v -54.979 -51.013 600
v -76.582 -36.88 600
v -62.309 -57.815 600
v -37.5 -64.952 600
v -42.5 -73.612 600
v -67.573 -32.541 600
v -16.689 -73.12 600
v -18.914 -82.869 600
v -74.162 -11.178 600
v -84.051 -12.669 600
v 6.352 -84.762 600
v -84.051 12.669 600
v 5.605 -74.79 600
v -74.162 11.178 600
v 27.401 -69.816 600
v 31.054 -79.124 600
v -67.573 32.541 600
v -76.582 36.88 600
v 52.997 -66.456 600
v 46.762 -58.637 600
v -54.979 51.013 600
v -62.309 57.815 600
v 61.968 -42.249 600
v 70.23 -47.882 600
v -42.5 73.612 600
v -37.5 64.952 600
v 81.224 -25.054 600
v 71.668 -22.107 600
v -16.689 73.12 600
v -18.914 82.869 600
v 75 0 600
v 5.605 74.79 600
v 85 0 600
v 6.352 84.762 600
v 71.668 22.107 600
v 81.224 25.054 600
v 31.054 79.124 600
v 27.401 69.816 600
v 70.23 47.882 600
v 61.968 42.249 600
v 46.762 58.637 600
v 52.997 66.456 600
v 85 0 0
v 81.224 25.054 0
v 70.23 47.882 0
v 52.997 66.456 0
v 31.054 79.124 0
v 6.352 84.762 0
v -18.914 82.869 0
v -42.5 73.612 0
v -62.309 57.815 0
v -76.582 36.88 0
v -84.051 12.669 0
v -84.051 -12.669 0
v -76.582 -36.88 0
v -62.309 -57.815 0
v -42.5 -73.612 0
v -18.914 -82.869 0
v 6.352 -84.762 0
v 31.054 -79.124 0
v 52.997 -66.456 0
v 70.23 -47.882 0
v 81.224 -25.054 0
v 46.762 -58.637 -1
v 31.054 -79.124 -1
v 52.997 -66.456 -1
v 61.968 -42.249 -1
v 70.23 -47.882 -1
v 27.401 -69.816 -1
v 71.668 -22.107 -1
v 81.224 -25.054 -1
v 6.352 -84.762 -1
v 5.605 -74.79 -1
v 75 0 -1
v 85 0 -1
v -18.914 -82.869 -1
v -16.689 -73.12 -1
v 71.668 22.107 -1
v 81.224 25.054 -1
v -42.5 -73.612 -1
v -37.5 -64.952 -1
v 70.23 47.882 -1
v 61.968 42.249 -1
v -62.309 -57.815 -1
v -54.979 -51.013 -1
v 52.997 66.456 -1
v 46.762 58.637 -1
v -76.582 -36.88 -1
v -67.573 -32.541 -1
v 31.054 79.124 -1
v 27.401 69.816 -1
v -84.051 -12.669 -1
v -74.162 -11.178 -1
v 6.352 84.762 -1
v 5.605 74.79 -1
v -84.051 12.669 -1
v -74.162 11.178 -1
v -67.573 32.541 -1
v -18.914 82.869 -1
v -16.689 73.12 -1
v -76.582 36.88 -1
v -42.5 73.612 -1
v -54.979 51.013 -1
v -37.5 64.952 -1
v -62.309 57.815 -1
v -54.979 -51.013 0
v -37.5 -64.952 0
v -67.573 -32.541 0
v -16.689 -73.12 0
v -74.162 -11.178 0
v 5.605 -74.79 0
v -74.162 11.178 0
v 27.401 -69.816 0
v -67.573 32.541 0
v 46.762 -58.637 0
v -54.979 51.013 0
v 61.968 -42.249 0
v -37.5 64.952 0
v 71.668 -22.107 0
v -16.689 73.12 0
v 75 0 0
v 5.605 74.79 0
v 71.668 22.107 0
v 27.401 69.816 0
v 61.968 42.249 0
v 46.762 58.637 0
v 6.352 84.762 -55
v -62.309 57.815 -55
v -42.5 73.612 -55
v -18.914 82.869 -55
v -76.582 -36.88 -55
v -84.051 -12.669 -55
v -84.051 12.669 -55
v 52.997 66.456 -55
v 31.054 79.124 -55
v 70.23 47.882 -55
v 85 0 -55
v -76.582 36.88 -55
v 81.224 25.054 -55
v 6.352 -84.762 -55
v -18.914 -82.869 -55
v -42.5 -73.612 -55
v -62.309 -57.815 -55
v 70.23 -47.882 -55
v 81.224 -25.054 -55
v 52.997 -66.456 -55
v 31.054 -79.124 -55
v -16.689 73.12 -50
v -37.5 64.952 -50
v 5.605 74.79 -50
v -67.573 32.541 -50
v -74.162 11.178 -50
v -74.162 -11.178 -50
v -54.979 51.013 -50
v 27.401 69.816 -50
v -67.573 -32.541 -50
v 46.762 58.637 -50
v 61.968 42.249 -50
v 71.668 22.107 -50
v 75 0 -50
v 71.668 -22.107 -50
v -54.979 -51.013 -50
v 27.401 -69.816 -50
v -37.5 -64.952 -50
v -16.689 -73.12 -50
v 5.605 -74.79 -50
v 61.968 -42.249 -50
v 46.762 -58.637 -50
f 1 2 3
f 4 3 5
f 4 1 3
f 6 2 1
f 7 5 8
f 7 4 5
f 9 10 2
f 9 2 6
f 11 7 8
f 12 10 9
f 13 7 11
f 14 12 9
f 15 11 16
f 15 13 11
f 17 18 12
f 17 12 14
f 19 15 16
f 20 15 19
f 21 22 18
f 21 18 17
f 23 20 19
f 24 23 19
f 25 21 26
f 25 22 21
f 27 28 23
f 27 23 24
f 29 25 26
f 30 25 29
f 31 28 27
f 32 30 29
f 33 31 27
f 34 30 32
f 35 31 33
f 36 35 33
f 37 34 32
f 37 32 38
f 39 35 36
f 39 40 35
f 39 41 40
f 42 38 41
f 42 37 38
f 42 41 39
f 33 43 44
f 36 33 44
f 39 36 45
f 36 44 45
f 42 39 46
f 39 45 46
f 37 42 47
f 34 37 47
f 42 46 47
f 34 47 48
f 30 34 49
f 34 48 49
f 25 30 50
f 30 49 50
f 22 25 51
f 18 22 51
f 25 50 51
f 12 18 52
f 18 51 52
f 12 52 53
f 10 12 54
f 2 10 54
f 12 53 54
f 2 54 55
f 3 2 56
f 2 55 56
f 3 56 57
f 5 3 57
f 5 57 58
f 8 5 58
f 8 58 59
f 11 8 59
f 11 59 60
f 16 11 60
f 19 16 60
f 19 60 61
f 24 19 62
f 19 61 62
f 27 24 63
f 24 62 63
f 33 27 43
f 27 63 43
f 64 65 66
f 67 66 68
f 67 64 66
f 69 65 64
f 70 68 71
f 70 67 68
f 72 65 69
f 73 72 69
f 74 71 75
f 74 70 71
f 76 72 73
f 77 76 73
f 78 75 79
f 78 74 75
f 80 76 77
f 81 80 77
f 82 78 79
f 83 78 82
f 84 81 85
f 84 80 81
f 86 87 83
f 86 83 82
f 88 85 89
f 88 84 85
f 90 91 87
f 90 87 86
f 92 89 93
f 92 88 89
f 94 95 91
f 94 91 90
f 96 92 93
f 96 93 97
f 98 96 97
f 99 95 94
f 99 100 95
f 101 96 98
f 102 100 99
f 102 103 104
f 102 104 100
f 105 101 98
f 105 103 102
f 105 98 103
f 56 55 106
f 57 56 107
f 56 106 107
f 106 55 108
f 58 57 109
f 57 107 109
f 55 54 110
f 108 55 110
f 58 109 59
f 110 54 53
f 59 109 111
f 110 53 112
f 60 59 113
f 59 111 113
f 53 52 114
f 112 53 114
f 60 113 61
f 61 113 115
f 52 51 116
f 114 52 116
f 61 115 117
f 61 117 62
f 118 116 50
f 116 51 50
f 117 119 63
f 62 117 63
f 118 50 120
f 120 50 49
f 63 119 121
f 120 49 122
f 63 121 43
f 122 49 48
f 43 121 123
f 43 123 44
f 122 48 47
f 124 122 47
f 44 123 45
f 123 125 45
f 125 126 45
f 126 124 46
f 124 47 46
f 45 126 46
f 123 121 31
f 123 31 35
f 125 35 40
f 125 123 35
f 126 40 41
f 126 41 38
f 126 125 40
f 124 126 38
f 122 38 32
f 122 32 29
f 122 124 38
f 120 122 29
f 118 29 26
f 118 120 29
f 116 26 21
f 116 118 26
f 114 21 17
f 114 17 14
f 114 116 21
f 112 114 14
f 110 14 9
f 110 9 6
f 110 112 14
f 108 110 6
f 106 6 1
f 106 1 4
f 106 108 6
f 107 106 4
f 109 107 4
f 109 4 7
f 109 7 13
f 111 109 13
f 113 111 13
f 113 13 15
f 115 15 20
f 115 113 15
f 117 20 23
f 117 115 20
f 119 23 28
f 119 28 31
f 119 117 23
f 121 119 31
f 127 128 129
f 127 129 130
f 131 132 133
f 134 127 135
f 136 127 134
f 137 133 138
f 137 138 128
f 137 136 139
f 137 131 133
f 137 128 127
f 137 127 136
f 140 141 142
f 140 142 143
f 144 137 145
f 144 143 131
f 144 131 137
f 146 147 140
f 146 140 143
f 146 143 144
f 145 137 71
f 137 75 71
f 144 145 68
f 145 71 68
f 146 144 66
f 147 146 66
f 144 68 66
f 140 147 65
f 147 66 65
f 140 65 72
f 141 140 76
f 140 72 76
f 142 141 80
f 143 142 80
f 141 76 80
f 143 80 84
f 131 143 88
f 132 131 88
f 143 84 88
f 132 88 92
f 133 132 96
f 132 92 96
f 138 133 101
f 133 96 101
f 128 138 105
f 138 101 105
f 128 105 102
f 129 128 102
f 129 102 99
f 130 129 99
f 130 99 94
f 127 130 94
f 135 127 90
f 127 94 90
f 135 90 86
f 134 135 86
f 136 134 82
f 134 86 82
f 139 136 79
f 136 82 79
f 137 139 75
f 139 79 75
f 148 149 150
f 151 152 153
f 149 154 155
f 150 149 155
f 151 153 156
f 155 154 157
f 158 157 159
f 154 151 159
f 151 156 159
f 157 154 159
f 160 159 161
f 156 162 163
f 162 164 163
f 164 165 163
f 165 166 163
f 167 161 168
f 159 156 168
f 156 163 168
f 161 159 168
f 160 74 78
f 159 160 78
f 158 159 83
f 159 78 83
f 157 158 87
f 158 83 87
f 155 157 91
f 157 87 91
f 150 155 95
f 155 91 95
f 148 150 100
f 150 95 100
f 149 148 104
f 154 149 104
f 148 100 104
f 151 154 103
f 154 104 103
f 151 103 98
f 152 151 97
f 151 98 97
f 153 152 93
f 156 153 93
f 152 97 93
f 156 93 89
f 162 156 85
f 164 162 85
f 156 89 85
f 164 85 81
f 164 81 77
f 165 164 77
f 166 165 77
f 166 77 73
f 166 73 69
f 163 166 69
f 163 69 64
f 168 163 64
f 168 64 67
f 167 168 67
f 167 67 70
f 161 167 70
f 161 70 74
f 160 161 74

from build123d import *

# Parameters (mm, degrees)
F0_R          = 85
F0_R_2        = 75
F1_DEPTH      = 600
F2_DEPTH      = 50
F3_W          = 175
F3_H          = 1
F4_DEPTH      = 85.9
F4_DEPTH_BACK = 91.3
F5_R          = 85
F6_DEPTH      = 5


with BuildPart() as f1:
    # F0 (on Top) → F1 (new body)
    with BuildSketch(Plane.XY):
        Circle(F0_R)
        Circle(F0_R_2, mode=Mode.SUBTRACT)
    extrude(amount=F1_DEPTH)


with BuildPart() as f2:
    # F2 (new): a face of the model
    f2_faces = [f1.part.faces().sort_by_distance(p)[0] for p in [
        (-82.595836944, 0, 0),
    ]]
    extrude(f2_faces, amount=F2_DEPTH)

    # F3 (on Right) → F4 (cut, two sides)
    with BuildSketch(Plane.YZ) as f4_sk:
        with Locations((0.6284113847, -0.5)):
            Rectangle(F3_W, F3_H)
    extrude(amount=-F4_DEPTH, mode=Mode.SUBTRACT)
    extrude(f4_sk.sketch, amount=F4_DEPTH_BACK, mode=Mode.SUBTRACT)

    # F5 (on face) → F6 (join)
    with BuildSketch(Plane(origin=(0, 0, -50), x_dir=(1, 0, 0), z_dir=(0, 0, -1))):
        Circle(F5_R)
    extrude(amount=F6_DEPTH)


solid = Compound([f1.part, f2.part])
